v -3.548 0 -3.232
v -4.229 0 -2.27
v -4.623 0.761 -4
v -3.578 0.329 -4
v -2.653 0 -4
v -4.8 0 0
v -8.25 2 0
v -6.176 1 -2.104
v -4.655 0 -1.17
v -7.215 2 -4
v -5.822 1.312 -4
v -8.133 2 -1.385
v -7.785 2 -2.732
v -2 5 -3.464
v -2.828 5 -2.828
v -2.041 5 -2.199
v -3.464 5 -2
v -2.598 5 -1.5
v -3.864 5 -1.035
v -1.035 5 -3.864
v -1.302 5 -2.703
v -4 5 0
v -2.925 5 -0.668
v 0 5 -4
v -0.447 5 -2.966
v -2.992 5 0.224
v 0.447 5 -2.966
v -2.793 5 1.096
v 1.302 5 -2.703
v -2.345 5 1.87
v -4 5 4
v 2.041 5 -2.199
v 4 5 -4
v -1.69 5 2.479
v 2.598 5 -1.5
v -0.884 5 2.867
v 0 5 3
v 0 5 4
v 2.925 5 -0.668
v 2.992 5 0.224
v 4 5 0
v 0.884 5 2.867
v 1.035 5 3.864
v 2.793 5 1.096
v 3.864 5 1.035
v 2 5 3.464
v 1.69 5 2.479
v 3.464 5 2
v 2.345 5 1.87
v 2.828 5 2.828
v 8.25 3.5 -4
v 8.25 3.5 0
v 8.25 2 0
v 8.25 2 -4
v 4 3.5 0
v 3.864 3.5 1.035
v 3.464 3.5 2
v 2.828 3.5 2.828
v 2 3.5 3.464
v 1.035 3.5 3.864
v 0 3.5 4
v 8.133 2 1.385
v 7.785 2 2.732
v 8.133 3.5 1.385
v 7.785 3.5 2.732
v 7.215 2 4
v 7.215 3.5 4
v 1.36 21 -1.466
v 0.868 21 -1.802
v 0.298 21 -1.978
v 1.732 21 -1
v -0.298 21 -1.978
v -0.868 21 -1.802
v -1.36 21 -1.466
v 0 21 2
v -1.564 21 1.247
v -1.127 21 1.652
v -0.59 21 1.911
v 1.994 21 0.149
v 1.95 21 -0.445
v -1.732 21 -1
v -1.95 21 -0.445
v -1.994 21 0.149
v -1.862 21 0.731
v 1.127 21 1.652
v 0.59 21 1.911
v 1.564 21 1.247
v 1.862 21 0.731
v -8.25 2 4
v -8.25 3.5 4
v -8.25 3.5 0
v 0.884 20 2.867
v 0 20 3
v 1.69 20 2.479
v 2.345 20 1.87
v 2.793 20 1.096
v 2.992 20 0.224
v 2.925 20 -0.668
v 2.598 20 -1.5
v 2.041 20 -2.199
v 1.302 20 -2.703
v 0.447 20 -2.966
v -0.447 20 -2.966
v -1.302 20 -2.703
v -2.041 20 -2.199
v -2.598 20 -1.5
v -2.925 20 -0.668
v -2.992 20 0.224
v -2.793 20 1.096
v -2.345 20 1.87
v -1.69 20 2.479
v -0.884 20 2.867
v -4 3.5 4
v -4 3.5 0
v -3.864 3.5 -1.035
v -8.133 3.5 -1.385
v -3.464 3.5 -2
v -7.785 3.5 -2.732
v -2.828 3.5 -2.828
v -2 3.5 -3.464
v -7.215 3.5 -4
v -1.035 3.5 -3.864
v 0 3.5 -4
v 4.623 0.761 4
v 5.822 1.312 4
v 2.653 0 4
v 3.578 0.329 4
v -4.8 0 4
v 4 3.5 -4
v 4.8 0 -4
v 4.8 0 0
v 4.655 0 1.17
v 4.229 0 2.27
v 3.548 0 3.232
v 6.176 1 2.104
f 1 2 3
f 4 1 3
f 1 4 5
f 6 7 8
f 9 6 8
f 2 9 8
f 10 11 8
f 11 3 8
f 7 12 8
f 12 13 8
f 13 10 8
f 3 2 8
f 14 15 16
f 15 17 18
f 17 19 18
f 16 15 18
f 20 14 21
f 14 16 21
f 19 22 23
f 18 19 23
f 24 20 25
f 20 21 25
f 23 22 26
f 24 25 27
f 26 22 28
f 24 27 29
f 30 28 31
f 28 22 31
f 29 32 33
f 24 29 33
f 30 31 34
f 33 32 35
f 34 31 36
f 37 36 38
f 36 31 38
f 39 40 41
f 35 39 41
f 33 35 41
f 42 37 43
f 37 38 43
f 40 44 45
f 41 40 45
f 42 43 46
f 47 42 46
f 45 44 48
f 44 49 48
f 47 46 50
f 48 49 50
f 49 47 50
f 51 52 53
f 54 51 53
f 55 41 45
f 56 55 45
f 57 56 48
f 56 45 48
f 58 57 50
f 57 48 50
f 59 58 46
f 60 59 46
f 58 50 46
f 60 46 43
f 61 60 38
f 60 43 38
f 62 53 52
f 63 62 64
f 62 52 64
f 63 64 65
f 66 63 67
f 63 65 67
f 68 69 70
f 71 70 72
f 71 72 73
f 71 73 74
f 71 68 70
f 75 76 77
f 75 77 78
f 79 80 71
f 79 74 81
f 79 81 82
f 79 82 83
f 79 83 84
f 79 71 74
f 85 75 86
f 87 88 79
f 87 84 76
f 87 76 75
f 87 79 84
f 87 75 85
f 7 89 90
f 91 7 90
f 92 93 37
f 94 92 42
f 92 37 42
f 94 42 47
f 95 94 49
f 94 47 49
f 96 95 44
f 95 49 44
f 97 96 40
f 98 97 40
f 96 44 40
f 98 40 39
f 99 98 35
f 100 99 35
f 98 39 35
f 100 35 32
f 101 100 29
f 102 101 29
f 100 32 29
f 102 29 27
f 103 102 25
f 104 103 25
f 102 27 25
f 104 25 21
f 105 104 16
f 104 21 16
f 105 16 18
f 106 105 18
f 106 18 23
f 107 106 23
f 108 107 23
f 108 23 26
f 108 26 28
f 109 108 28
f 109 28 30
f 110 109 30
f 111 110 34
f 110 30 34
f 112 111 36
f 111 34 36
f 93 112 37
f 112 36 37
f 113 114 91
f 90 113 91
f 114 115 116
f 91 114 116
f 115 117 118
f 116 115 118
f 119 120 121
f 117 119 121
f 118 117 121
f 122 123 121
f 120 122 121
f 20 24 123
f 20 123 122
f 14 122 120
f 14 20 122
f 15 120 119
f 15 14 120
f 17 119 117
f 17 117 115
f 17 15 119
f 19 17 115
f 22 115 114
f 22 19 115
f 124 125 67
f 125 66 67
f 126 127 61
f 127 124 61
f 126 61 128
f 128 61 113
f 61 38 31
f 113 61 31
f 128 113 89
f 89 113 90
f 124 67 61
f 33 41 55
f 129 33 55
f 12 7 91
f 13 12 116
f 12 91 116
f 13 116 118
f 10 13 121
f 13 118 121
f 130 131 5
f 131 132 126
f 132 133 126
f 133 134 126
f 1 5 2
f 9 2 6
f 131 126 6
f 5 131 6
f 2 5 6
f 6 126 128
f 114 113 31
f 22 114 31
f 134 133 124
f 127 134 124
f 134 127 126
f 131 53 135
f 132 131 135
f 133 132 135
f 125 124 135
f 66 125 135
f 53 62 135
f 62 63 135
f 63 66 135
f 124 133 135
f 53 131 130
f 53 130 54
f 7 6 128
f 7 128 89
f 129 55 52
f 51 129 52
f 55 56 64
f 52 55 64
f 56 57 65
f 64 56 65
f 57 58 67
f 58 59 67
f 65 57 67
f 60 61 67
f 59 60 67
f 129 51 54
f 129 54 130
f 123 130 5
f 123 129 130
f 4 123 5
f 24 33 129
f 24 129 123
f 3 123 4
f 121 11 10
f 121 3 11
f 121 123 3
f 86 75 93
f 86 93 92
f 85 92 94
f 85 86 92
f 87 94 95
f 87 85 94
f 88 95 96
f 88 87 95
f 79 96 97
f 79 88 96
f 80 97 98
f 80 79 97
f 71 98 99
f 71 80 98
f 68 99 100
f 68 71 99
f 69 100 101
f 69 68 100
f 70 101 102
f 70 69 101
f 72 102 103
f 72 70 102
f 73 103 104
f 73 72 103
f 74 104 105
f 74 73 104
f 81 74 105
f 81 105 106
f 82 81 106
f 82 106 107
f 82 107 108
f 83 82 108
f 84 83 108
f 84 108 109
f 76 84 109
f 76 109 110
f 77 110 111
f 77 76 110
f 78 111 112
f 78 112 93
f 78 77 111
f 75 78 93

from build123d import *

# Parameters (mm, degrees)
EXTRUDE_1_DEPTH     = 4
SKETCH_2_R          = 3
EXTRUDE_2_DEPTH     = 16
CUT_EXTRUDE_1_DEPTH = 1.5
CUT_EXTRUDE_2_DEPTH = 4.5
CHAMFER_2_SIZE      = 1


with BuildPart() as part:
    # Эскиз1 → Бобышка-Вытянуть1 (new body, symmetric)
    with BuildSketch(Plane.XY):
        Polygon((8.25, 0), (-8.25, 0), (-8.25, 3.5), (-4, 3.5), (-4, 5), (4, 5), (4, 3.5), (8.25, 3.5), align=None)
    extrude(amount=EXTRUDE_1_DEPTH, both=True)

    # Эскиз2 → Бобышка-Вытянуть2 (add)
    with BuildSketch(Plane(origin=(0, 5, 0), x_dir=(1, 0, 0), z_dir=(0, 1, 0))):
        with Locations(Location((0, 0, 0), (0, 0, 270))):  # turned: the seam where the file's is
            Circle(SKETCH_2_R)
    extrude(amount=EXTRUDE_2_DEPTH)

    # Эскиз3 → Вырез-Вытянуть1 (cut)
    with BuildSketch(Plane(origin=(0, 5, 0), x_dir=(1, 0, 0), z_dir=(0, 1, 0))):
        with BuildLine():
            Line((-4, 0), (-4, 4))
            Line((-4, 4), (0, 4))
            ThreePointArc((0, 4), (-2.828427125, 2.828427125), (-4, 0))
        make_face()
        with BuildLine():
            Line((0, -4), (4, -4))
            Line((4, -4), (4, 0))
            ThreePointArc((4, 0), (2.828427125, -2.828427125), (0, -4))
        make_face()
    extrude(amount=-CUT_EXTRUDE_1_DEPTH, mode=Mode.SUBTRACT)

    # Эскиз4 → Вырез-Вытянуть2 (cut, through all)
    with BuildSketch(Plane(origin=(0, 3.5, 0), x_dir=(1, 0, 0), z_dir=(0, 1, 0))):
        with BuildLine():
            Line((-7.215434845, 4), (-8.25, 4))
            Line((-8.25, 4), (-8.25, 0))
            ThreePointArc((-8.25, 0), (-7.987172136, 2.065812495), (-7.215434845, 4))
        make_face()
        with BuildLine():
            Line((7.215434845, -4), (8.25, -4))
            Line((8.25, -4), (8.25, 0))
            ThreePointArc((8.25, 0), (7.987172136, -2.065812495), (7.215434845, -4))
        make_face()
    extrude(amount=-CUT_EXTRUDE_2_DEPTH, mode=Mode.SUBTRACT)

    # Вырез-По траектории1: sweep along a path in Эскиз6
    with BuildLine(Plane.XZ) as sweep_1_path:
        Line((0, -8.25), (8.25, -8.25))
        Line((8.25, -8.25), (8.25, 0))
        ThreePointArc((8.25, 0), (5.833630945, 5.833630945), (0, 8.25))
        Line((0, 8.25), (-8.25, 8.25))
        Line((-8.25, 8.25), (-8.25, 0))
        ThreePointArc((-8.25, 0), (-5.833630945, -5.833630945), (0, -8.25))
    # Эскиз5 → Вырез-По траектории1 (sweep, cut)
    with BuildSketch(Plane.XY.offset(4)):
        Polygon((-8.25, 2), (-4.8, 0), (-8.25, 0), align=None)
    sweep(path=sweep_1_path.line, transition=Transition.RIGHT, mode=Mode.SUBTRACT)

    # Фаска2
    chamfer_2_edges = [part.edges().sort_by_distance(p)[0] for p in [
        (0, 21, -3),
    ]]
    chamfer(chamfer_2_edges, length=CHAMFER_2_SIZE)


solid = part.part
